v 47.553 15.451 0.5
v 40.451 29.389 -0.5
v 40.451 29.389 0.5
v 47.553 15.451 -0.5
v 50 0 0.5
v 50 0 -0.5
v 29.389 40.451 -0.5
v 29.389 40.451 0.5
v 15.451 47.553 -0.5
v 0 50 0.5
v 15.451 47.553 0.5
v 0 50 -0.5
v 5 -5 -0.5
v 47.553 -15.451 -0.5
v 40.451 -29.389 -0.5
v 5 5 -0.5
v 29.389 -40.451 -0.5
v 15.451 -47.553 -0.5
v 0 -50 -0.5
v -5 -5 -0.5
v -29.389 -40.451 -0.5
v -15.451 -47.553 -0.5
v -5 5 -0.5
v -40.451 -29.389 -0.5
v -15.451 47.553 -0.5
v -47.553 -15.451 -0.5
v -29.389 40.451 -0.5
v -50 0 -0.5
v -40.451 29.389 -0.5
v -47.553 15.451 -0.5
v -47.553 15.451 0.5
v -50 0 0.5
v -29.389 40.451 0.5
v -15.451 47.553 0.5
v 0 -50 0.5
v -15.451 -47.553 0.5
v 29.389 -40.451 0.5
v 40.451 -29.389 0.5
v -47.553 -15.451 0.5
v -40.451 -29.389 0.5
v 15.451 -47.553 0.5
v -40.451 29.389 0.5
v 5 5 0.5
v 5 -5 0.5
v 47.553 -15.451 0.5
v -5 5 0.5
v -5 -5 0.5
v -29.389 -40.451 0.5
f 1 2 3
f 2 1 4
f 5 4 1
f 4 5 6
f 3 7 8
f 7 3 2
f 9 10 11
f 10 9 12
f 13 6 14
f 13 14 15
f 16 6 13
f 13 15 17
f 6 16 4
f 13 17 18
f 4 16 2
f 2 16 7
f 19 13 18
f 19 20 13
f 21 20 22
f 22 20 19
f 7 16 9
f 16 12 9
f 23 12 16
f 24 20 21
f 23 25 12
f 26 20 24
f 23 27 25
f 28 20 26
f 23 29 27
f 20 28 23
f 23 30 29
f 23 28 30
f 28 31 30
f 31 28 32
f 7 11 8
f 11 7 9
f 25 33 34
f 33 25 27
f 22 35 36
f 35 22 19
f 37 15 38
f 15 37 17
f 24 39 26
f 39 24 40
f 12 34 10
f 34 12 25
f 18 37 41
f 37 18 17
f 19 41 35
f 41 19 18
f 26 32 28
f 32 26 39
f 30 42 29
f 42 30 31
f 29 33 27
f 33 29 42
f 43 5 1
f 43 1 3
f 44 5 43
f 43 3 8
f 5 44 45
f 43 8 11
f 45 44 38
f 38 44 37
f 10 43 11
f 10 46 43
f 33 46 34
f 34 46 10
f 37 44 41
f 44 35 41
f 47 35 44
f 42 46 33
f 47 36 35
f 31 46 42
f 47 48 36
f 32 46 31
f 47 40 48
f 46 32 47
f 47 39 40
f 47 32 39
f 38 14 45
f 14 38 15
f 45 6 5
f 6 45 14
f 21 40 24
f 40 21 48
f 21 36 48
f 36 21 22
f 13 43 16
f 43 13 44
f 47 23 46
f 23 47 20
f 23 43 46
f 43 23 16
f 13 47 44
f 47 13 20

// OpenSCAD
dowel_size = 10;

separator_disk_thickness = 1;
separator_disk_radius = 50;

heddle_cam_long_side = separator_disk_radius/2;
heddle_cam_short_side = heddle_cam_long_side/2;

module dowel() {
    cube([dowel_size, dowel_size, 20], center=true);
}

module separator_disk() {
    difference() {
        cylinder(separator_disk_thickness,
                r=separator_disk_radius,
                center=true,
                $fn=20);
        dowel();
    };
    
}

module heddle_cam() {
    difference() {
        scale([heddle_cam_long_side, heddle_cam_short_side, 1])
            cylinder(1, 1, center=true, $fn=20);
        dowel();
    };
}

separator_disk();
//heddle_cam();
//dowel();
